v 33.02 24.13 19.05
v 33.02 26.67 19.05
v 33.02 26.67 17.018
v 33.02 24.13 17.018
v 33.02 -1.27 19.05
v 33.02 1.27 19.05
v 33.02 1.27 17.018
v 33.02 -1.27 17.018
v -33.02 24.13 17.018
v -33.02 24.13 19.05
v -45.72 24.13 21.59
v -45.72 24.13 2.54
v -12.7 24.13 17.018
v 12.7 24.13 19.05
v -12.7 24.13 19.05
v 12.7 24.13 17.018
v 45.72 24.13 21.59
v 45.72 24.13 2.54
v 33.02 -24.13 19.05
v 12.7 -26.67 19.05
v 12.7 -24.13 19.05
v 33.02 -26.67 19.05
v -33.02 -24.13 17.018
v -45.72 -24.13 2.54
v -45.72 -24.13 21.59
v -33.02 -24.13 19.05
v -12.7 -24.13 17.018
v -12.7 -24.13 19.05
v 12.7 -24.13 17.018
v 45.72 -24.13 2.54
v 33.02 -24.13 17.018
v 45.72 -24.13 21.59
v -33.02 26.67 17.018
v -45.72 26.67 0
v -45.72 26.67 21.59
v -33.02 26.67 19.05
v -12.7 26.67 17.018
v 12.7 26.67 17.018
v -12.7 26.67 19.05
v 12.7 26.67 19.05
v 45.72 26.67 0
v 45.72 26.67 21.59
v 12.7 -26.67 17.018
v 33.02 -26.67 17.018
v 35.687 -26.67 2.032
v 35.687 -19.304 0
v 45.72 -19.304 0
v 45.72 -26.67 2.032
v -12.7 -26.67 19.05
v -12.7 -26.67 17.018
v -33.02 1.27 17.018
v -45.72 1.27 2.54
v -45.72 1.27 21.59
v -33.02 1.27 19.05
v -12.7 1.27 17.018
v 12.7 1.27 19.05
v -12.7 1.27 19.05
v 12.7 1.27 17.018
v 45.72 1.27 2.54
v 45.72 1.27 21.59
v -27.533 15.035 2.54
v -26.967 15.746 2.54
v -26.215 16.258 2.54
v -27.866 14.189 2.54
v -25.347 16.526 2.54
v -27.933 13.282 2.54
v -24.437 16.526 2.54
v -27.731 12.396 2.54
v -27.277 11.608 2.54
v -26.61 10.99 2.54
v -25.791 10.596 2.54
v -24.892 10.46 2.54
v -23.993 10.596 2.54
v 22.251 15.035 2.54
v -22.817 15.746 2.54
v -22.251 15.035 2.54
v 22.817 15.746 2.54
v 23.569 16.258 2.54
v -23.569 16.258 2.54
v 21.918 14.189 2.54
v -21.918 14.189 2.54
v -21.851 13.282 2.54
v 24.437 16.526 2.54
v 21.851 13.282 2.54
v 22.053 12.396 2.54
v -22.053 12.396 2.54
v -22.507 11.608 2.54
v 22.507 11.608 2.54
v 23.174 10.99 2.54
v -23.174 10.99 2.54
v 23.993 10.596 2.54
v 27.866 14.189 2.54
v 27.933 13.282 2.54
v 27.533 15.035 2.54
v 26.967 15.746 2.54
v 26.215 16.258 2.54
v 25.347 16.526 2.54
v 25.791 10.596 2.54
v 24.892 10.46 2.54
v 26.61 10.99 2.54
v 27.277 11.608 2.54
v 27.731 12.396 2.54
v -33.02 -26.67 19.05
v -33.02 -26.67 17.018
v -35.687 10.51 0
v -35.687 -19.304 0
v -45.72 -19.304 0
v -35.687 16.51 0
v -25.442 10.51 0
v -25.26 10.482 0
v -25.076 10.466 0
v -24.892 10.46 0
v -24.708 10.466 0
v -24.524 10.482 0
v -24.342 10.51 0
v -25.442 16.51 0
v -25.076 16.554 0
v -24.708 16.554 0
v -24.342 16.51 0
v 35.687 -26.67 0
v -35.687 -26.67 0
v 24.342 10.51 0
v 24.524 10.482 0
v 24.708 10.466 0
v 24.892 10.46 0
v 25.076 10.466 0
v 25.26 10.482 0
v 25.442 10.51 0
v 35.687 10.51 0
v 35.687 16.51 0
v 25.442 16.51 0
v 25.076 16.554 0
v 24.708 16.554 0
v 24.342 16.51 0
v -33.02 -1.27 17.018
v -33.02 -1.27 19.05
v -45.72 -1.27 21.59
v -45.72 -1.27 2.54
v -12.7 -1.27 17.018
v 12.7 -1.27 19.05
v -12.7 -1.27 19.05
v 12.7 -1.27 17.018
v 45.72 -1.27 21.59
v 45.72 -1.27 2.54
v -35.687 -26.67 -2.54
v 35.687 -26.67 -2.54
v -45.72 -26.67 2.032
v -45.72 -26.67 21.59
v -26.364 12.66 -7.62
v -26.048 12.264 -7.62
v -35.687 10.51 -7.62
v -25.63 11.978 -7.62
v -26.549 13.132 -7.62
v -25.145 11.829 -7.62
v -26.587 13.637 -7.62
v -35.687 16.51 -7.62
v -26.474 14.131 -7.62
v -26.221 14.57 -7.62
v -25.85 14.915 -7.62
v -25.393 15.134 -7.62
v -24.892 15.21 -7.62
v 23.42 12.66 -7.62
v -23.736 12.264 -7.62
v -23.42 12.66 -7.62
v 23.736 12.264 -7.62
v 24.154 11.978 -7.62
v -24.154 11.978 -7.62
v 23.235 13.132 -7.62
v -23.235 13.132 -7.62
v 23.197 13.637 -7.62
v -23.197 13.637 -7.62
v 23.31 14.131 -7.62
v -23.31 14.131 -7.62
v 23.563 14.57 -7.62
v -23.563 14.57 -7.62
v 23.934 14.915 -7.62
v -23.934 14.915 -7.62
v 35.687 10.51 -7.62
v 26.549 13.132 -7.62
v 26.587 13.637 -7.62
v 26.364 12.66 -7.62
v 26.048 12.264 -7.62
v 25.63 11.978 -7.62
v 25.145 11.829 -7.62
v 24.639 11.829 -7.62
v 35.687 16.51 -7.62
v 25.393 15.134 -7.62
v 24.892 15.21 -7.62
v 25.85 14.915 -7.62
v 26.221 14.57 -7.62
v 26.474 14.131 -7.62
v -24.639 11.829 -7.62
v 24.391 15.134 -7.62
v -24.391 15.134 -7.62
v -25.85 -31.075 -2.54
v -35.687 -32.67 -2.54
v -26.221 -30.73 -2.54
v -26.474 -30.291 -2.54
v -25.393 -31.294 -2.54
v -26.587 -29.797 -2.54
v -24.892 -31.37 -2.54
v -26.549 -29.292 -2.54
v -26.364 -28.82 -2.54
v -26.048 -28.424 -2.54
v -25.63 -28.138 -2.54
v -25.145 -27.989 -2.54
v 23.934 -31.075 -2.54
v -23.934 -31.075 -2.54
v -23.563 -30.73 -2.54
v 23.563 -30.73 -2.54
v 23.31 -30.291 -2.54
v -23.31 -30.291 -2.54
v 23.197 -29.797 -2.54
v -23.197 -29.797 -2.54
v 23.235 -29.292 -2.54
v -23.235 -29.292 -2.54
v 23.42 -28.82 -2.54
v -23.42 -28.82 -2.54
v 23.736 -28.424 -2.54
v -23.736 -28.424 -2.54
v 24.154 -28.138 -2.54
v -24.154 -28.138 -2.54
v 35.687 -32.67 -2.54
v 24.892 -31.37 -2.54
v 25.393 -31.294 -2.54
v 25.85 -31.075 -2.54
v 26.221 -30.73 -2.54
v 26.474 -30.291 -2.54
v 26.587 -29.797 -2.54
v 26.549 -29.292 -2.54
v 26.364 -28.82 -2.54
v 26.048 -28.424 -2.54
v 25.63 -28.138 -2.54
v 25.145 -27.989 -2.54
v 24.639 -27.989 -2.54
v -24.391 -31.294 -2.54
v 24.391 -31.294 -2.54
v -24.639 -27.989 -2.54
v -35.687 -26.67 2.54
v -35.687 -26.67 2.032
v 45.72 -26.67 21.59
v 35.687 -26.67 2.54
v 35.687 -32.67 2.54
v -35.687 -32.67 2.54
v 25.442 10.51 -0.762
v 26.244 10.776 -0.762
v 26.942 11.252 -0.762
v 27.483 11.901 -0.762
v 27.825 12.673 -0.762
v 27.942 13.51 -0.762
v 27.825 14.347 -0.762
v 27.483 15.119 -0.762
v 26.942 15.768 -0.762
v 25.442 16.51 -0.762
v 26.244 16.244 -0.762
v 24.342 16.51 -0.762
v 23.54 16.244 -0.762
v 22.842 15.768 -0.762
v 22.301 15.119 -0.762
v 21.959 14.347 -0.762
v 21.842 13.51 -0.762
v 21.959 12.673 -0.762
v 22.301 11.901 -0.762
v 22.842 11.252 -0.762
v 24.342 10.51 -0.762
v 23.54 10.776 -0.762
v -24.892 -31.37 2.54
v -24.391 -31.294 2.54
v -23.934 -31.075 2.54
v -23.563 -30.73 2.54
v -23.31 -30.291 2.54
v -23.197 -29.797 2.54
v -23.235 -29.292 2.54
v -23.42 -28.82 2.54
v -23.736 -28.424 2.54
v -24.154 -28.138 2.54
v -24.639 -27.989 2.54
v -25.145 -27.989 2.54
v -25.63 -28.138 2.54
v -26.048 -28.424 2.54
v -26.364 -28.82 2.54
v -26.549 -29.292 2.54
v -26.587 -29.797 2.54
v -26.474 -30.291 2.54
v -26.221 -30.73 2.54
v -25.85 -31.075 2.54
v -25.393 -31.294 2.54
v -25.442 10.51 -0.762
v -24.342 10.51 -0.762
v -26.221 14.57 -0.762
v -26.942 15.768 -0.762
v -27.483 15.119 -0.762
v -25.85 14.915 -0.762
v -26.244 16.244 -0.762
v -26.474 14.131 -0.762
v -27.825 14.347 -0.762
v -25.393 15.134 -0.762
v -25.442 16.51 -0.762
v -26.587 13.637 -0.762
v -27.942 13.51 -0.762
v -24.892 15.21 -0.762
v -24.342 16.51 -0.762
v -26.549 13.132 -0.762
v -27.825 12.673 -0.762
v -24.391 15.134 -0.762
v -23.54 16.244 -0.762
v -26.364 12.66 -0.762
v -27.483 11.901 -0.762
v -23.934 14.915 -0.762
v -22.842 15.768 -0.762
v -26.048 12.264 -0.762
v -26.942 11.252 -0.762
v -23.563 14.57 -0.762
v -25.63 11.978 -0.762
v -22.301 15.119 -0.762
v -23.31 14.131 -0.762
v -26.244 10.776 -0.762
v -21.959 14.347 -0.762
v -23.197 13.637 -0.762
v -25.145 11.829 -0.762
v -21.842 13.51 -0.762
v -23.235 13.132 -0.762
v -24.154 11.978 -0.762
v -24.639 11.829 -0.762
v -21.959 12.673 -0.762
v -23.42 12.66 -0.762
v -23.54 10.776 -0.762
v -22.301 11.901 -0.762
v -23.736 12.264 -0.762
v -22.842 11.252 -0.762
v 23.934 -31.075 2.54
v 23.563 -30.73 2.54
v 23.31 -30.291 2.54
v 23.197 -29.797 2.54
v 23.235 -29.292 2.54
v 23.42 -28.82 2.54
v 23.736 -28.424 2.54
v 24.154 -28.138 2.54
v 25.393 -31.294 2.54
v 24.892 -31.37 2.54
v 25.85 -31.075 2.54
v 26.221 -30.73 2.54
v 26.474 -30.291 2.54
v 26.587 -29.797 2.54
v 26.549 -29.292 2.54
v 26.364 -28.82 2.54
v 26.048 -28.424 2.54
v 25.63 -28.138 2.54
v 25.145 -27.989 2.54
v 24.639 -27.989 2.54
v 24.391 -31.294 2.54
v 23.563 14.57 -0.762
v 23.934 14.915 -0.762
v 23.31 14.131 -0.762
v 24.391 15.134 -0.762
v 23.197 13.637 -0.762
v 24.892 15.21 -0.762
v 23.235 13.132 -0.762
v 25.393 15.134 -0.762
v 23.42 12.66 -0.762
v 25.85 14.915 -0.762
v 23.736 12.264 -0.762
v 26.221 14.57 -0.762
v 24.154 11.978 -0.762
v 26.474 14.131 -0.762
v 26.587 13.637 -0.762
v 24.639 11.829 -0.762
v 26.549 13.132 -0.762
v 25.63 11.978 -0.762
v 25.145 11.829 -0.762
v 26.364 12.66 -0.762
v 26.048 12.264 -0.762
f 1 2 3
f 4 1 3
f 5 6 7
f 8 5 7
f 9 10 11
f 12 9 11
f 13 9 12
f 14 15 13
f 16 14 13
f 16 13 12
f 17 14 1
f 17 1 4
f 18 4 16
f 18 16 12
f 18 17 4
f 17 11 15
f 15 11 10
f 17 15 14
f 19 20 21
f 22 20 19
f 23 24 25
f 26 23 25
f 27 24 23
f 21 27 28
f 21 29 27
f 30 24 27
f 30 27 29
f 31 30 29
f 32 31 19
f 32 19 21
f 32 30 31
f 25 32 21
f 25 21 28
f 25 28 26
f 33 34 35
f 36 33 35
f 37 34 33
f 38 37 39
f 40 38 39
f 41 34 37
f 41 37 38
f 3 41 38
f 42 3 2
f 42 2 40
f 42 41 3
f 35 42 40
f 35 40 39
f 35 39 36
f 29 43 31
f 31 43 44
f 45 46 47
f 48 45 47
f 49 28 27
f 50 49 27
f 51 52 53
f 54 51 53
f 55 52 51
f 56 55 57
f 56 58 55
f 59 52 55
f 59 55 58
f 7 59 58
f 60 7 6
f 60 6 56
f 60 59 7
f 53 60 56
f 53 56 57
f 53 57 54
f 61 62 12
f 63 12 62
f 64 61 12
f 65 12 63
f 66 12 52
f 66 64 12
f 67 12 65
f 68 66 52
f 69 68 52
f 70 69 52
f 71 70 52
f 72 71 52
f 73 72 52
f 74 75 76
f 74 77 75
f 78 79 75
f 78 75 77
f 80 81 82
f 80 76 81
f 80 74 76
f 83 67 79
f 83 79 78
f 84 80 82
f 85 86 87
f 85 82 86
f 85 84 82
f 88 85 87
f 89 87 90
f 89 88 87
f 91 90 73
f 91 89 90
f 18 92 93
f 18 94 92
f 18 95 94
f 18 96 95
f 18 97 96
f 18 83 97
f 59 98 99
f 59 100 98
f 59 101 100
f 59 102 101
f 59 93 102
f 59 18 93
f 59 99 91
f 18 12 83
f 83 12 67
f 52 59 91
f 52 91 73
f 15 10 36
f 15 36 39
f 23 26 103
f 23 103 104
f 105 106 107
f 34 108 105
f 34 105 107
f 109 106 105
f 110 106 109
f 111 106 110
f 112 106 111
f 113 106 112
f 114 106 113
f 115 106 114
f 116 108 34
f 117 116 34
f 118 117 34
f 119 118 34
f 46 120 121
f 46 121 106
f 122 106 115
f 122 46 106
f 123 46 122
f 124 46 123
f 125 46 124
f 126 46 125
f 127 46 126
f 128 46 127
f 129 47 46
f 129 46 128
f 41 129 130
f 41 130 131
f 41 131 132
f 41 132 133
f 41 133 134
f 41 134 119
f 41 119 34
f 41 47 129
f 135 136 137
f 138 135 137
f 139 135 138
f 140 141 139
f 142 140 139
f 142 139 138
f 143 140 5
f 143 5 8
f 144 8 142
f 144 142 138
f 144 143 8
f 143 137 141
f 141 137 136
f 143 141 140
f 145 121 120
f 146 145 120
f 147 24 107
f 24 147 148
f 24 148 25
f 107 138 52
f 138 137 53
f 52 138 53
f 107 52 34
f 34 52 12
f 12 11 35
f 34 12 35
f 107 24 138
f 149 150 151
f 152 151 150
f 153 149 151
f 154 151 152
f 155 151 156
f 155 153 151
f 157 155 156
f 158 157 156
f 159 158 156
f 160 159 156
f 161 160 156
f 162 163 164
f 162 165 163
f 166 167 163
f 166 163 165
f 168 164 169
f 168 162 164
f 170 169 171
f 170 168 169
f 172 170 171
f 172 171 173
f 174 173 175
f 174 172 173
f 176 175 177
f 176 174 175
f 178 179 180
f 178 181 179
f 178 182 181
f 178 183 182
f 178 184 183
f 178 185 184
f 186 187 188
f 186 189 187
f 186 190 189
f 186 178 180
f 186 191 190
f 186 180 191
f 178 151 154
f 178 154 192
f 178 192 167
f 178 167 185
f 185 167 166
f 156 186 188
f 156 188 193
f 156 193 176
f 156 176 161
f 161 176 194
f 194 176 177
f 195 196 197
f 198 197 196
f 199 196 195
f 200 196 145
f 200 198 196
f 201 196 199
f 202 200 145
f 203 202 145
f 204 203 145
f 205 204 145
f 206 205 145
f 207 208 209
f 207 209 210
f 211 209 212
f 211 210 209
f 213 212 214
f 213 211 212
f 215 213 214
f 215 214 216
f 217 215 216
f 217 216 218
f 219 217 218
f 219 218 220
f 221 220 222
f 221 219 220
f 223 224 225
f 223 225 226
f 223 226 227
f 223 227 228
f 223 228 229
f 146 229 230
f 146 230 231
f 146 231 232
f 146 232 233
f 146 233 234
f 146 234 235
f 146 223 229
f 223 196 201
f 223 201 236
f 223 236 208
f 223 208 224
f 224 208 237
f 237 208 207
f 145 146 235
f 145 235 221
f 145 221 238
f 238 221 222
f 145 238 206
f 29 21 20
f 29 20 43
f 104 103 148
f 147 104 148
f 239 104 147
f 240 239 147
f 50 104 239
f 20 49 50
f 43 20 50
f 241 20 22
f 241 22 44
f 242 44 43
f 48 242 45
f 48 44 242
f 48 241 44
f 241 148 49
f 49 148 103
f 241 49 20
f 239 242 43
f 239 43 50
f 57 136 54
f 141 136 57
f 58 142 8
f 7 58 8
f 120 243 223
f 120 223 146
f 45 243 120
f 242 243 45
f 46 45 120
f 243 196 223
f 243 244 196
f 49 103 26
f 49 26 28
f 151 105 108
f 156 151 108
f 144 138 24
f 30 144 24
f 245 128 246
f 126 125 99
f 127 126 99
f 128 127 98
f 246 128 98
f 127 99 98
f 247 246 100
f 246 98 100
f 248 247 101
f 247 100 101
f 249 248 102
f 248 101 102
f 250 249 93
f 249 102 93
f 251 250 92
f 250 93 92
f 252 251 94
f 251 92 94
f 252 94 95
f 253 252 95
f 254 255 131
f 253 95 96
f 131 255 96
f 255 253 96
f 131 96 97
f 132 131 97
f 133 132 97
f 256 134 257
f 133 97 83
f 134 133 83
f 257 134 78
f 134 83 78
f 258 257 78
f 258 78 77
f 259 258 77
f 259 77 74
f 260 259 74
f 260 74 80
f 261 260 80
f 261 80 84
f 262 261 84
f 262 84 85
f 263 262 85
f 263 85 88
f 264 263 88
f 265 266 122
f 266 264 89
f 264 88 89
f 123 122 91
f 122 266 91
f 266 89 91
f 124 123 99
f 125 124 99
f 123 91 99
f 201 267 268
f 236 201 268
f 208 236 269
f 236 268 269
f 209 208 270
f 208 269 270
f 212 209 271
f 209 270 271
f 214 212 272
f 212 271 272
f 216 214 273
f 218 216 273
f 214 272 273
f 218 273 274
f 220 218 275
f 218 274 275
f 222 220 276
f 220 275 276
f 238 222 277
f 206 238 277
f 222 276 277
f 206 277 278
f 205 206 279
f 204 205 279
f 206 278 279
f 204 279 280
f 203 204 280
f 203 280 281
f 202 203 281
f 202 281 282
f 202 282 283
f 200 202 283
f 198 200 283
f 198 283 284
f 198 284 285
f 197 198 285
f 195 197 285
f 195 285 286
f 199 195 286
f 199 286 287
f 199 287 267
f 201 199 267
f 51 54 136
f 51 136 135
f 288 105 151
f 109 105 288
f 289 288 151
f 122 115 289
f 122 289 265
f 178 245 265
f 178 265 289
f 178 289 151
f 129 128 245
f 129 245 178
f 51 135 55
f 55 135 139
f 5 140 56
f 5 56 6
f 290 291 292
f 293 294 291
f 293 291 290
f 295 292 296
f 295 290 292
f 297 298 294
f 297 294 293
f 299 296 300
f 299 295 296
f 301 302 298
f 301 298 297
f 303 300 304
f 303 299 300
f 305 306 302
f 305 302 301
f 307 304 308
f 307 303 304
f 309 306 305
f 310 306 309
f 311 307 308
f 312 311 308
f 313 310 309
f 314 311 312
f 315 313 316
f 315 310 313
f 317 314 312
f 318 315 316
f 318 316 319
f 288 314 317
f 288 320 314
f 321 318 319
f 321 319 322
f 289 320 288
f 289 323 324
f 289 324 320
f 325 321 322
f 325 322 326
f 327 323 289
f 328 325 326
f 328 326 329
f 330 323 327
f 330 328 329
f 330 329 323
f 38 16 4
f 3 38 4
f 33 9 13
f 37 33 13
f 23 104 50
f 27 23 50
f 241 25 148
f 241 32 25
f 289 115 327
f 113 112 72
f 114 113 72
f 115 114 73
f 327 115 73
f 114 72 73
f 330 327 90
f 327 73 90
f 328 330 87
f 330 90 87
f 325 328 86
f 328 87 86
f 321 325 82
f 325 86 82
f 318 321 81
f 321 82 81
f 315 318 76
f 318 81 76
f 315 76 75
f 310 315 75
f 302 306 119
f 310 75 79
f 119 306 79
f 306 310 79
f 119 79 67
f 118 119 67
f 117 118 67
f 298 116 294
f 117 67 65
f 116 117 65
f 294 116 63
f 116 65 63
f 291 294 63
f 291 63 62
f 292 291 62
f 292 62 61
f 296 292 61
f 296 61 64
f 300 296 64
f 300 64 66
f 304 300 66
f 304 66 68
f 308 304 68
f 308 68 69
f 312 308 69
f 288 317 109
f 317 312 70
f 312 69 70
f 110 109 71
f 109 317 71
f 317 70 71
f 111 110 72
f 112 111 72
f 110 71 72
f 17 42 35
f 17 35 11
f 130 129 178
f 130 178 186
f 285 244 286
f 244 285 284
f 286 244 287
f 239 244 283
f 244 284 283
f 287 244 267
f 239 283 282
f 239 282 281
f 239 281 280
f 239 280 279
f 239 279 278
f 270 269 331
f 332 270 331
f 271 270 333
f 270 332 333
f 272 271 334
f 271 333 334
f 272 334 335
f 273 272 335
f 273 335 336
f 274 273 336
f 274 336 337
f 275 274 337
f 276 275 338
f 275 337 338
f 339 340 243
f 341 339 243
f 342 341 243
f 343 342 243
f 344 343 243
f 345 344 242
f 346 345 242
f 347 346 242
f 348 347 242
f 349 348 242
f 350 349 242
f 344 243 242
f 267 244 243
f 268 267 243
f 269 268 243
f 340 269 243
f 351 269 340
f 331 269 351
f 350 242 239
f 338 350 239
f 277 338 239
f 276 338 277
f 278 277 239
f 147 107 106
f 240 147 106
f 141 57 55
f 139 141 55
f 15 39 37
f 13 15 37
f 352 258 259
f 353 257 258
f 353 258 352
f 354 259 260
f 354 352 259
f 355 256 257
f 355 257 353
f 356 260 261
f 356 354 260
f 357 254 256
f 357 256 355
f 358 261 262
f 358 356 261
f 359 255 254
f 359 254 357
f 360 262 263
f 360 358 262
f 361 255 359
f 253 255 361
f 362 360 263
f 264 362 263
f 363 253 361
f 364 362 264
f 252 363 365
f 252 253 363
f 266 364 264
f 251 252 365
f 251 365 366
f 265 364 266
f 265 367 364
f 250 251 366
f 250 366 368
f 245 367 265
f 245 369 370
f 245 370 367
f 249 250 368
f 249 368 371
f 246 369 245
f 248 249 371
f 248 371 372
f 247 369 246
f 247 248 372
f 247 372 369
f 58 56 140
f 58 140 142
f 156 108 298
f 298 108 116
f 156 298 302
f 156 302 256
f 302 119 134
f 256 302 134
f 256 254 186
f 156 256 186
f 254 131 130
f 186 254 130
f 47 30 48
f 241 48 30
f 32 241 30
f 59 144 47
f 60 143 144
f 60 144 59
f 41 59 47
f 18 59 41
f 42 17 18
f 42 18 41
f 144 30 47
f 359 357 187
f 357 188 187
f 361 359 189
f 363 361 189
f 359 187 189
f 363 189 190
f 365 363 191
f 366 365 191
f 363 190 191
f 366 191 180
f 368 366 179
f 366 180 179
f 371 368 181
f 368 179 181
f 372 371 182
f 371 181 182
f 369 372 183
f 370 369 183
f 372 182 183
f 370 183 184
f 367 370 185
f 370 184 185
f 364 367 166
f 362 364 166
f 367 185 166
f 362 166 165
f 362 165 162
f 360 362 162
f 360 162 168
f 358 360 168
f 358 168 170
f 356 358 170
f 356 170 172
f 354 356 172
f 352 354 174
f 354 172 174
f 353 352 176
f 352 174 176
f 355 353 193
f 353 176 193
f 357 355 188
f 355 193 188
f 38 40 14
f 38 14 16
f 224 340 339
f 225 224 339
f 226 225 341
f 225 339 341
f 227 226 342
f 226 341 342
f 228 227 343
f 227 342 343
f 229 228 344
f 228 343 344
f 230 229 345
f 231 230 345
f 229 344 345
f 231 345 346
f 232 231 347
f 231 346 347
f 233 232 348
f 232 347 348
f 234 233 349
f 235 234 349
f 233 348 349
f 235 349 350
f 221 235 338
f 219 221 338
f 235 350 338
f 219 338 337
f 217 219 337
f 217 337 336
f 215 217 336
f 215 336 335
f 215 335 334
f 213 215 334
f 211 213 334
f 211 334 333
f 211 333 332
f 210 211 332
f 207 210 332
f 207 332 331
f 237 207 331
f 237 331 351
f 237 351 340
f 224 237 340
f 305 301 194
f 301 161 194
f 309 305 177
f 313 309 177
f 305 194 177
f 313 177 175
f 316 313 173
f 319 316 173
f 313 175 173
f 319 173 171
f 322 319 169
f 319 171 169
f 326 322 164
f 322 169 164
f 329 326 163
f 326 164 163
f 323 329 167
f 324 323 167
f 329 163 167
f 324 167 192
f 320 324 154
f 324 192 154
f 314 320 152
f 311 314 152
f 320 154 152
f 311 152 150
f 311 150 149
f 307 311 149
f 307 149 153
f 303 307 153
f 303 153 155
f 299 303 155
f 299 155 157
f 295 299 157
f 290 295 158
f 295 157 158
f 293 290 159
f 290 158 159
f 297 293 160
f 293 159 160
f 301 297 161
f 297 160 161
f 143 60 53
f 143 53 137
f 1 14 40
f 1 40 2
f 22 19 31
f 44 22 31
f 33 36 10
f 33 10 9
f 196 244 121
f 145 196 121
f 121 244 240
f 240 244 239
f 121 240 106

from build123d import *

# Parameters (mm, degrees)
PAD_DEPTH           = 45.72
PAD_DEPTH_BACK      = 45.72
SKETCH001_W         = 2.032
SKETCH001_H         = 20.32
POCKET_DEPTH        = 53.341
SKETCH002_W         = 6
SKETCH002_H         = 71.374
PAD001_DEPTH        = 2.54
PAD001_DEPTH_BACK   = 2.54
SKETCH003_R         = 1.7
HOLE_DEPTH          = 5.081
SKETCH004_W         = 6
SKETCH004_H         = 71.374
PAD002_DEPTH        = 7.62
HOLE001_D           = 3.4
HOLE001_DEPTH       = 24.892
HOLE001_CBORE_D     = 6.1
HOLE001_CBORE_DEPTH = 3.302
CHAMFER_SIZE2       = 7.366
CHAMFER_SIZE        = 2.032


with BuildPart() as part:
    # Sketch → Pad (new body, two sides)
    with BuildSketch(Plane.YZ) as pad_sk:
        Polygon((-26.67, 21.59), (-26.67, 0), (26.67, 0), (26.67, 21.59), (24.13, 21.59), (24.13, 2.54), (1.27, 2.54), (1.27, 21.59), (-1.27, 21.59), (-1.27, 2.54), (-24.13, 2.54), (-24.13, 21.59), align=None)
    extrude(amount=PAD_DEPTH)
    extrude(pad_sk.sketch, amount=-PAD_DEPTH_BACK)

    # Sketch001 (on Face1 of Pad) → Pocket (cut, through all)
    with BuildSketch(Plane(origin=(0, -26.67, 0), x_dir=(0, 0, -1), z_dir=(0, -1, 0))):
        with Locations((-18.034, -22.86)):
            Rectangle(SKETCH001_W, SKETCH001_H)
        with Locations((-18.034, 22.86)):
            Rectangle(SKETCH001_W, SKETCH001_H)
    extrude(amount=-POCKET_DEPTH, mode=Mode.SUBTRACT)

    # Sketch002 (on Face5 of Pocket) → Pad001 (join, two sides)
    with BuildSketch(Plane.YX) as pad001_sk:
        with Locations((-29.67, 0)):
            Rectangle(SKETCH002_W, SKETCH002_H)
    extrude(amount=-PAD001_DEPTH)
    extrude(pad001_sk.sketch, amount=PAD001_DEPTH_BACK)

    # Sketch003 (on Face5 of Pad001) → Hole (cut, through all)
    with BuildSketch(Plane(origin=(0, 0, 2.54), x_dir=(0, -1, 0), z_dir=(0, 0, 1))):
        with Locations((29.67, -24.892)):
            Circle(SKETCH003_R)
        with Locations((29.67, 24.892)):
            Circle(SKETCH003_R)
    extrude(amount=-HOLE_DEPTH, mode=Mode.SUBTRACT)

    # Sketch004 (on Face3 of Hole) → Pad002 (join)
    with BuildSketch(Plane.YX):
        with Locations((13.51, 0)):
            Rectangle(SKETCH004_W, SKETCH004_H)
    extrude(amount=PAD002_DEPTH)

    # Hole001
    with Locations(Plane(origin=(0, 0, 2.54), x_dir=(0, -1, 0), z_dir=(0, 0, 1))):
        with Locations((-13.51, 24.892), (-13.51, -24.892)):
            CounterBoreHole(HOLE001_D / 2, HOLE001_CBORE_D / 2, HOLE001_CBORE_DEPTH, depth=HOLE001_DEPTH)

    # Chamfer
    chamfer_edges = [part.edges().sort_by_distance(p)[0] for p in [
        (-40.7035, -26.67, 0),
        (40.7035, -26.67, 0),
    ]]
    chamfer_side = part.faces().sort_by_distance((0, -26.67, 11.455103))[0]
    chamfer(chamfer_edges, length=CHAMFER_SIZE, length2=CHAMFER_SIZE2, reference=chamfer_side)


solid = part.part
